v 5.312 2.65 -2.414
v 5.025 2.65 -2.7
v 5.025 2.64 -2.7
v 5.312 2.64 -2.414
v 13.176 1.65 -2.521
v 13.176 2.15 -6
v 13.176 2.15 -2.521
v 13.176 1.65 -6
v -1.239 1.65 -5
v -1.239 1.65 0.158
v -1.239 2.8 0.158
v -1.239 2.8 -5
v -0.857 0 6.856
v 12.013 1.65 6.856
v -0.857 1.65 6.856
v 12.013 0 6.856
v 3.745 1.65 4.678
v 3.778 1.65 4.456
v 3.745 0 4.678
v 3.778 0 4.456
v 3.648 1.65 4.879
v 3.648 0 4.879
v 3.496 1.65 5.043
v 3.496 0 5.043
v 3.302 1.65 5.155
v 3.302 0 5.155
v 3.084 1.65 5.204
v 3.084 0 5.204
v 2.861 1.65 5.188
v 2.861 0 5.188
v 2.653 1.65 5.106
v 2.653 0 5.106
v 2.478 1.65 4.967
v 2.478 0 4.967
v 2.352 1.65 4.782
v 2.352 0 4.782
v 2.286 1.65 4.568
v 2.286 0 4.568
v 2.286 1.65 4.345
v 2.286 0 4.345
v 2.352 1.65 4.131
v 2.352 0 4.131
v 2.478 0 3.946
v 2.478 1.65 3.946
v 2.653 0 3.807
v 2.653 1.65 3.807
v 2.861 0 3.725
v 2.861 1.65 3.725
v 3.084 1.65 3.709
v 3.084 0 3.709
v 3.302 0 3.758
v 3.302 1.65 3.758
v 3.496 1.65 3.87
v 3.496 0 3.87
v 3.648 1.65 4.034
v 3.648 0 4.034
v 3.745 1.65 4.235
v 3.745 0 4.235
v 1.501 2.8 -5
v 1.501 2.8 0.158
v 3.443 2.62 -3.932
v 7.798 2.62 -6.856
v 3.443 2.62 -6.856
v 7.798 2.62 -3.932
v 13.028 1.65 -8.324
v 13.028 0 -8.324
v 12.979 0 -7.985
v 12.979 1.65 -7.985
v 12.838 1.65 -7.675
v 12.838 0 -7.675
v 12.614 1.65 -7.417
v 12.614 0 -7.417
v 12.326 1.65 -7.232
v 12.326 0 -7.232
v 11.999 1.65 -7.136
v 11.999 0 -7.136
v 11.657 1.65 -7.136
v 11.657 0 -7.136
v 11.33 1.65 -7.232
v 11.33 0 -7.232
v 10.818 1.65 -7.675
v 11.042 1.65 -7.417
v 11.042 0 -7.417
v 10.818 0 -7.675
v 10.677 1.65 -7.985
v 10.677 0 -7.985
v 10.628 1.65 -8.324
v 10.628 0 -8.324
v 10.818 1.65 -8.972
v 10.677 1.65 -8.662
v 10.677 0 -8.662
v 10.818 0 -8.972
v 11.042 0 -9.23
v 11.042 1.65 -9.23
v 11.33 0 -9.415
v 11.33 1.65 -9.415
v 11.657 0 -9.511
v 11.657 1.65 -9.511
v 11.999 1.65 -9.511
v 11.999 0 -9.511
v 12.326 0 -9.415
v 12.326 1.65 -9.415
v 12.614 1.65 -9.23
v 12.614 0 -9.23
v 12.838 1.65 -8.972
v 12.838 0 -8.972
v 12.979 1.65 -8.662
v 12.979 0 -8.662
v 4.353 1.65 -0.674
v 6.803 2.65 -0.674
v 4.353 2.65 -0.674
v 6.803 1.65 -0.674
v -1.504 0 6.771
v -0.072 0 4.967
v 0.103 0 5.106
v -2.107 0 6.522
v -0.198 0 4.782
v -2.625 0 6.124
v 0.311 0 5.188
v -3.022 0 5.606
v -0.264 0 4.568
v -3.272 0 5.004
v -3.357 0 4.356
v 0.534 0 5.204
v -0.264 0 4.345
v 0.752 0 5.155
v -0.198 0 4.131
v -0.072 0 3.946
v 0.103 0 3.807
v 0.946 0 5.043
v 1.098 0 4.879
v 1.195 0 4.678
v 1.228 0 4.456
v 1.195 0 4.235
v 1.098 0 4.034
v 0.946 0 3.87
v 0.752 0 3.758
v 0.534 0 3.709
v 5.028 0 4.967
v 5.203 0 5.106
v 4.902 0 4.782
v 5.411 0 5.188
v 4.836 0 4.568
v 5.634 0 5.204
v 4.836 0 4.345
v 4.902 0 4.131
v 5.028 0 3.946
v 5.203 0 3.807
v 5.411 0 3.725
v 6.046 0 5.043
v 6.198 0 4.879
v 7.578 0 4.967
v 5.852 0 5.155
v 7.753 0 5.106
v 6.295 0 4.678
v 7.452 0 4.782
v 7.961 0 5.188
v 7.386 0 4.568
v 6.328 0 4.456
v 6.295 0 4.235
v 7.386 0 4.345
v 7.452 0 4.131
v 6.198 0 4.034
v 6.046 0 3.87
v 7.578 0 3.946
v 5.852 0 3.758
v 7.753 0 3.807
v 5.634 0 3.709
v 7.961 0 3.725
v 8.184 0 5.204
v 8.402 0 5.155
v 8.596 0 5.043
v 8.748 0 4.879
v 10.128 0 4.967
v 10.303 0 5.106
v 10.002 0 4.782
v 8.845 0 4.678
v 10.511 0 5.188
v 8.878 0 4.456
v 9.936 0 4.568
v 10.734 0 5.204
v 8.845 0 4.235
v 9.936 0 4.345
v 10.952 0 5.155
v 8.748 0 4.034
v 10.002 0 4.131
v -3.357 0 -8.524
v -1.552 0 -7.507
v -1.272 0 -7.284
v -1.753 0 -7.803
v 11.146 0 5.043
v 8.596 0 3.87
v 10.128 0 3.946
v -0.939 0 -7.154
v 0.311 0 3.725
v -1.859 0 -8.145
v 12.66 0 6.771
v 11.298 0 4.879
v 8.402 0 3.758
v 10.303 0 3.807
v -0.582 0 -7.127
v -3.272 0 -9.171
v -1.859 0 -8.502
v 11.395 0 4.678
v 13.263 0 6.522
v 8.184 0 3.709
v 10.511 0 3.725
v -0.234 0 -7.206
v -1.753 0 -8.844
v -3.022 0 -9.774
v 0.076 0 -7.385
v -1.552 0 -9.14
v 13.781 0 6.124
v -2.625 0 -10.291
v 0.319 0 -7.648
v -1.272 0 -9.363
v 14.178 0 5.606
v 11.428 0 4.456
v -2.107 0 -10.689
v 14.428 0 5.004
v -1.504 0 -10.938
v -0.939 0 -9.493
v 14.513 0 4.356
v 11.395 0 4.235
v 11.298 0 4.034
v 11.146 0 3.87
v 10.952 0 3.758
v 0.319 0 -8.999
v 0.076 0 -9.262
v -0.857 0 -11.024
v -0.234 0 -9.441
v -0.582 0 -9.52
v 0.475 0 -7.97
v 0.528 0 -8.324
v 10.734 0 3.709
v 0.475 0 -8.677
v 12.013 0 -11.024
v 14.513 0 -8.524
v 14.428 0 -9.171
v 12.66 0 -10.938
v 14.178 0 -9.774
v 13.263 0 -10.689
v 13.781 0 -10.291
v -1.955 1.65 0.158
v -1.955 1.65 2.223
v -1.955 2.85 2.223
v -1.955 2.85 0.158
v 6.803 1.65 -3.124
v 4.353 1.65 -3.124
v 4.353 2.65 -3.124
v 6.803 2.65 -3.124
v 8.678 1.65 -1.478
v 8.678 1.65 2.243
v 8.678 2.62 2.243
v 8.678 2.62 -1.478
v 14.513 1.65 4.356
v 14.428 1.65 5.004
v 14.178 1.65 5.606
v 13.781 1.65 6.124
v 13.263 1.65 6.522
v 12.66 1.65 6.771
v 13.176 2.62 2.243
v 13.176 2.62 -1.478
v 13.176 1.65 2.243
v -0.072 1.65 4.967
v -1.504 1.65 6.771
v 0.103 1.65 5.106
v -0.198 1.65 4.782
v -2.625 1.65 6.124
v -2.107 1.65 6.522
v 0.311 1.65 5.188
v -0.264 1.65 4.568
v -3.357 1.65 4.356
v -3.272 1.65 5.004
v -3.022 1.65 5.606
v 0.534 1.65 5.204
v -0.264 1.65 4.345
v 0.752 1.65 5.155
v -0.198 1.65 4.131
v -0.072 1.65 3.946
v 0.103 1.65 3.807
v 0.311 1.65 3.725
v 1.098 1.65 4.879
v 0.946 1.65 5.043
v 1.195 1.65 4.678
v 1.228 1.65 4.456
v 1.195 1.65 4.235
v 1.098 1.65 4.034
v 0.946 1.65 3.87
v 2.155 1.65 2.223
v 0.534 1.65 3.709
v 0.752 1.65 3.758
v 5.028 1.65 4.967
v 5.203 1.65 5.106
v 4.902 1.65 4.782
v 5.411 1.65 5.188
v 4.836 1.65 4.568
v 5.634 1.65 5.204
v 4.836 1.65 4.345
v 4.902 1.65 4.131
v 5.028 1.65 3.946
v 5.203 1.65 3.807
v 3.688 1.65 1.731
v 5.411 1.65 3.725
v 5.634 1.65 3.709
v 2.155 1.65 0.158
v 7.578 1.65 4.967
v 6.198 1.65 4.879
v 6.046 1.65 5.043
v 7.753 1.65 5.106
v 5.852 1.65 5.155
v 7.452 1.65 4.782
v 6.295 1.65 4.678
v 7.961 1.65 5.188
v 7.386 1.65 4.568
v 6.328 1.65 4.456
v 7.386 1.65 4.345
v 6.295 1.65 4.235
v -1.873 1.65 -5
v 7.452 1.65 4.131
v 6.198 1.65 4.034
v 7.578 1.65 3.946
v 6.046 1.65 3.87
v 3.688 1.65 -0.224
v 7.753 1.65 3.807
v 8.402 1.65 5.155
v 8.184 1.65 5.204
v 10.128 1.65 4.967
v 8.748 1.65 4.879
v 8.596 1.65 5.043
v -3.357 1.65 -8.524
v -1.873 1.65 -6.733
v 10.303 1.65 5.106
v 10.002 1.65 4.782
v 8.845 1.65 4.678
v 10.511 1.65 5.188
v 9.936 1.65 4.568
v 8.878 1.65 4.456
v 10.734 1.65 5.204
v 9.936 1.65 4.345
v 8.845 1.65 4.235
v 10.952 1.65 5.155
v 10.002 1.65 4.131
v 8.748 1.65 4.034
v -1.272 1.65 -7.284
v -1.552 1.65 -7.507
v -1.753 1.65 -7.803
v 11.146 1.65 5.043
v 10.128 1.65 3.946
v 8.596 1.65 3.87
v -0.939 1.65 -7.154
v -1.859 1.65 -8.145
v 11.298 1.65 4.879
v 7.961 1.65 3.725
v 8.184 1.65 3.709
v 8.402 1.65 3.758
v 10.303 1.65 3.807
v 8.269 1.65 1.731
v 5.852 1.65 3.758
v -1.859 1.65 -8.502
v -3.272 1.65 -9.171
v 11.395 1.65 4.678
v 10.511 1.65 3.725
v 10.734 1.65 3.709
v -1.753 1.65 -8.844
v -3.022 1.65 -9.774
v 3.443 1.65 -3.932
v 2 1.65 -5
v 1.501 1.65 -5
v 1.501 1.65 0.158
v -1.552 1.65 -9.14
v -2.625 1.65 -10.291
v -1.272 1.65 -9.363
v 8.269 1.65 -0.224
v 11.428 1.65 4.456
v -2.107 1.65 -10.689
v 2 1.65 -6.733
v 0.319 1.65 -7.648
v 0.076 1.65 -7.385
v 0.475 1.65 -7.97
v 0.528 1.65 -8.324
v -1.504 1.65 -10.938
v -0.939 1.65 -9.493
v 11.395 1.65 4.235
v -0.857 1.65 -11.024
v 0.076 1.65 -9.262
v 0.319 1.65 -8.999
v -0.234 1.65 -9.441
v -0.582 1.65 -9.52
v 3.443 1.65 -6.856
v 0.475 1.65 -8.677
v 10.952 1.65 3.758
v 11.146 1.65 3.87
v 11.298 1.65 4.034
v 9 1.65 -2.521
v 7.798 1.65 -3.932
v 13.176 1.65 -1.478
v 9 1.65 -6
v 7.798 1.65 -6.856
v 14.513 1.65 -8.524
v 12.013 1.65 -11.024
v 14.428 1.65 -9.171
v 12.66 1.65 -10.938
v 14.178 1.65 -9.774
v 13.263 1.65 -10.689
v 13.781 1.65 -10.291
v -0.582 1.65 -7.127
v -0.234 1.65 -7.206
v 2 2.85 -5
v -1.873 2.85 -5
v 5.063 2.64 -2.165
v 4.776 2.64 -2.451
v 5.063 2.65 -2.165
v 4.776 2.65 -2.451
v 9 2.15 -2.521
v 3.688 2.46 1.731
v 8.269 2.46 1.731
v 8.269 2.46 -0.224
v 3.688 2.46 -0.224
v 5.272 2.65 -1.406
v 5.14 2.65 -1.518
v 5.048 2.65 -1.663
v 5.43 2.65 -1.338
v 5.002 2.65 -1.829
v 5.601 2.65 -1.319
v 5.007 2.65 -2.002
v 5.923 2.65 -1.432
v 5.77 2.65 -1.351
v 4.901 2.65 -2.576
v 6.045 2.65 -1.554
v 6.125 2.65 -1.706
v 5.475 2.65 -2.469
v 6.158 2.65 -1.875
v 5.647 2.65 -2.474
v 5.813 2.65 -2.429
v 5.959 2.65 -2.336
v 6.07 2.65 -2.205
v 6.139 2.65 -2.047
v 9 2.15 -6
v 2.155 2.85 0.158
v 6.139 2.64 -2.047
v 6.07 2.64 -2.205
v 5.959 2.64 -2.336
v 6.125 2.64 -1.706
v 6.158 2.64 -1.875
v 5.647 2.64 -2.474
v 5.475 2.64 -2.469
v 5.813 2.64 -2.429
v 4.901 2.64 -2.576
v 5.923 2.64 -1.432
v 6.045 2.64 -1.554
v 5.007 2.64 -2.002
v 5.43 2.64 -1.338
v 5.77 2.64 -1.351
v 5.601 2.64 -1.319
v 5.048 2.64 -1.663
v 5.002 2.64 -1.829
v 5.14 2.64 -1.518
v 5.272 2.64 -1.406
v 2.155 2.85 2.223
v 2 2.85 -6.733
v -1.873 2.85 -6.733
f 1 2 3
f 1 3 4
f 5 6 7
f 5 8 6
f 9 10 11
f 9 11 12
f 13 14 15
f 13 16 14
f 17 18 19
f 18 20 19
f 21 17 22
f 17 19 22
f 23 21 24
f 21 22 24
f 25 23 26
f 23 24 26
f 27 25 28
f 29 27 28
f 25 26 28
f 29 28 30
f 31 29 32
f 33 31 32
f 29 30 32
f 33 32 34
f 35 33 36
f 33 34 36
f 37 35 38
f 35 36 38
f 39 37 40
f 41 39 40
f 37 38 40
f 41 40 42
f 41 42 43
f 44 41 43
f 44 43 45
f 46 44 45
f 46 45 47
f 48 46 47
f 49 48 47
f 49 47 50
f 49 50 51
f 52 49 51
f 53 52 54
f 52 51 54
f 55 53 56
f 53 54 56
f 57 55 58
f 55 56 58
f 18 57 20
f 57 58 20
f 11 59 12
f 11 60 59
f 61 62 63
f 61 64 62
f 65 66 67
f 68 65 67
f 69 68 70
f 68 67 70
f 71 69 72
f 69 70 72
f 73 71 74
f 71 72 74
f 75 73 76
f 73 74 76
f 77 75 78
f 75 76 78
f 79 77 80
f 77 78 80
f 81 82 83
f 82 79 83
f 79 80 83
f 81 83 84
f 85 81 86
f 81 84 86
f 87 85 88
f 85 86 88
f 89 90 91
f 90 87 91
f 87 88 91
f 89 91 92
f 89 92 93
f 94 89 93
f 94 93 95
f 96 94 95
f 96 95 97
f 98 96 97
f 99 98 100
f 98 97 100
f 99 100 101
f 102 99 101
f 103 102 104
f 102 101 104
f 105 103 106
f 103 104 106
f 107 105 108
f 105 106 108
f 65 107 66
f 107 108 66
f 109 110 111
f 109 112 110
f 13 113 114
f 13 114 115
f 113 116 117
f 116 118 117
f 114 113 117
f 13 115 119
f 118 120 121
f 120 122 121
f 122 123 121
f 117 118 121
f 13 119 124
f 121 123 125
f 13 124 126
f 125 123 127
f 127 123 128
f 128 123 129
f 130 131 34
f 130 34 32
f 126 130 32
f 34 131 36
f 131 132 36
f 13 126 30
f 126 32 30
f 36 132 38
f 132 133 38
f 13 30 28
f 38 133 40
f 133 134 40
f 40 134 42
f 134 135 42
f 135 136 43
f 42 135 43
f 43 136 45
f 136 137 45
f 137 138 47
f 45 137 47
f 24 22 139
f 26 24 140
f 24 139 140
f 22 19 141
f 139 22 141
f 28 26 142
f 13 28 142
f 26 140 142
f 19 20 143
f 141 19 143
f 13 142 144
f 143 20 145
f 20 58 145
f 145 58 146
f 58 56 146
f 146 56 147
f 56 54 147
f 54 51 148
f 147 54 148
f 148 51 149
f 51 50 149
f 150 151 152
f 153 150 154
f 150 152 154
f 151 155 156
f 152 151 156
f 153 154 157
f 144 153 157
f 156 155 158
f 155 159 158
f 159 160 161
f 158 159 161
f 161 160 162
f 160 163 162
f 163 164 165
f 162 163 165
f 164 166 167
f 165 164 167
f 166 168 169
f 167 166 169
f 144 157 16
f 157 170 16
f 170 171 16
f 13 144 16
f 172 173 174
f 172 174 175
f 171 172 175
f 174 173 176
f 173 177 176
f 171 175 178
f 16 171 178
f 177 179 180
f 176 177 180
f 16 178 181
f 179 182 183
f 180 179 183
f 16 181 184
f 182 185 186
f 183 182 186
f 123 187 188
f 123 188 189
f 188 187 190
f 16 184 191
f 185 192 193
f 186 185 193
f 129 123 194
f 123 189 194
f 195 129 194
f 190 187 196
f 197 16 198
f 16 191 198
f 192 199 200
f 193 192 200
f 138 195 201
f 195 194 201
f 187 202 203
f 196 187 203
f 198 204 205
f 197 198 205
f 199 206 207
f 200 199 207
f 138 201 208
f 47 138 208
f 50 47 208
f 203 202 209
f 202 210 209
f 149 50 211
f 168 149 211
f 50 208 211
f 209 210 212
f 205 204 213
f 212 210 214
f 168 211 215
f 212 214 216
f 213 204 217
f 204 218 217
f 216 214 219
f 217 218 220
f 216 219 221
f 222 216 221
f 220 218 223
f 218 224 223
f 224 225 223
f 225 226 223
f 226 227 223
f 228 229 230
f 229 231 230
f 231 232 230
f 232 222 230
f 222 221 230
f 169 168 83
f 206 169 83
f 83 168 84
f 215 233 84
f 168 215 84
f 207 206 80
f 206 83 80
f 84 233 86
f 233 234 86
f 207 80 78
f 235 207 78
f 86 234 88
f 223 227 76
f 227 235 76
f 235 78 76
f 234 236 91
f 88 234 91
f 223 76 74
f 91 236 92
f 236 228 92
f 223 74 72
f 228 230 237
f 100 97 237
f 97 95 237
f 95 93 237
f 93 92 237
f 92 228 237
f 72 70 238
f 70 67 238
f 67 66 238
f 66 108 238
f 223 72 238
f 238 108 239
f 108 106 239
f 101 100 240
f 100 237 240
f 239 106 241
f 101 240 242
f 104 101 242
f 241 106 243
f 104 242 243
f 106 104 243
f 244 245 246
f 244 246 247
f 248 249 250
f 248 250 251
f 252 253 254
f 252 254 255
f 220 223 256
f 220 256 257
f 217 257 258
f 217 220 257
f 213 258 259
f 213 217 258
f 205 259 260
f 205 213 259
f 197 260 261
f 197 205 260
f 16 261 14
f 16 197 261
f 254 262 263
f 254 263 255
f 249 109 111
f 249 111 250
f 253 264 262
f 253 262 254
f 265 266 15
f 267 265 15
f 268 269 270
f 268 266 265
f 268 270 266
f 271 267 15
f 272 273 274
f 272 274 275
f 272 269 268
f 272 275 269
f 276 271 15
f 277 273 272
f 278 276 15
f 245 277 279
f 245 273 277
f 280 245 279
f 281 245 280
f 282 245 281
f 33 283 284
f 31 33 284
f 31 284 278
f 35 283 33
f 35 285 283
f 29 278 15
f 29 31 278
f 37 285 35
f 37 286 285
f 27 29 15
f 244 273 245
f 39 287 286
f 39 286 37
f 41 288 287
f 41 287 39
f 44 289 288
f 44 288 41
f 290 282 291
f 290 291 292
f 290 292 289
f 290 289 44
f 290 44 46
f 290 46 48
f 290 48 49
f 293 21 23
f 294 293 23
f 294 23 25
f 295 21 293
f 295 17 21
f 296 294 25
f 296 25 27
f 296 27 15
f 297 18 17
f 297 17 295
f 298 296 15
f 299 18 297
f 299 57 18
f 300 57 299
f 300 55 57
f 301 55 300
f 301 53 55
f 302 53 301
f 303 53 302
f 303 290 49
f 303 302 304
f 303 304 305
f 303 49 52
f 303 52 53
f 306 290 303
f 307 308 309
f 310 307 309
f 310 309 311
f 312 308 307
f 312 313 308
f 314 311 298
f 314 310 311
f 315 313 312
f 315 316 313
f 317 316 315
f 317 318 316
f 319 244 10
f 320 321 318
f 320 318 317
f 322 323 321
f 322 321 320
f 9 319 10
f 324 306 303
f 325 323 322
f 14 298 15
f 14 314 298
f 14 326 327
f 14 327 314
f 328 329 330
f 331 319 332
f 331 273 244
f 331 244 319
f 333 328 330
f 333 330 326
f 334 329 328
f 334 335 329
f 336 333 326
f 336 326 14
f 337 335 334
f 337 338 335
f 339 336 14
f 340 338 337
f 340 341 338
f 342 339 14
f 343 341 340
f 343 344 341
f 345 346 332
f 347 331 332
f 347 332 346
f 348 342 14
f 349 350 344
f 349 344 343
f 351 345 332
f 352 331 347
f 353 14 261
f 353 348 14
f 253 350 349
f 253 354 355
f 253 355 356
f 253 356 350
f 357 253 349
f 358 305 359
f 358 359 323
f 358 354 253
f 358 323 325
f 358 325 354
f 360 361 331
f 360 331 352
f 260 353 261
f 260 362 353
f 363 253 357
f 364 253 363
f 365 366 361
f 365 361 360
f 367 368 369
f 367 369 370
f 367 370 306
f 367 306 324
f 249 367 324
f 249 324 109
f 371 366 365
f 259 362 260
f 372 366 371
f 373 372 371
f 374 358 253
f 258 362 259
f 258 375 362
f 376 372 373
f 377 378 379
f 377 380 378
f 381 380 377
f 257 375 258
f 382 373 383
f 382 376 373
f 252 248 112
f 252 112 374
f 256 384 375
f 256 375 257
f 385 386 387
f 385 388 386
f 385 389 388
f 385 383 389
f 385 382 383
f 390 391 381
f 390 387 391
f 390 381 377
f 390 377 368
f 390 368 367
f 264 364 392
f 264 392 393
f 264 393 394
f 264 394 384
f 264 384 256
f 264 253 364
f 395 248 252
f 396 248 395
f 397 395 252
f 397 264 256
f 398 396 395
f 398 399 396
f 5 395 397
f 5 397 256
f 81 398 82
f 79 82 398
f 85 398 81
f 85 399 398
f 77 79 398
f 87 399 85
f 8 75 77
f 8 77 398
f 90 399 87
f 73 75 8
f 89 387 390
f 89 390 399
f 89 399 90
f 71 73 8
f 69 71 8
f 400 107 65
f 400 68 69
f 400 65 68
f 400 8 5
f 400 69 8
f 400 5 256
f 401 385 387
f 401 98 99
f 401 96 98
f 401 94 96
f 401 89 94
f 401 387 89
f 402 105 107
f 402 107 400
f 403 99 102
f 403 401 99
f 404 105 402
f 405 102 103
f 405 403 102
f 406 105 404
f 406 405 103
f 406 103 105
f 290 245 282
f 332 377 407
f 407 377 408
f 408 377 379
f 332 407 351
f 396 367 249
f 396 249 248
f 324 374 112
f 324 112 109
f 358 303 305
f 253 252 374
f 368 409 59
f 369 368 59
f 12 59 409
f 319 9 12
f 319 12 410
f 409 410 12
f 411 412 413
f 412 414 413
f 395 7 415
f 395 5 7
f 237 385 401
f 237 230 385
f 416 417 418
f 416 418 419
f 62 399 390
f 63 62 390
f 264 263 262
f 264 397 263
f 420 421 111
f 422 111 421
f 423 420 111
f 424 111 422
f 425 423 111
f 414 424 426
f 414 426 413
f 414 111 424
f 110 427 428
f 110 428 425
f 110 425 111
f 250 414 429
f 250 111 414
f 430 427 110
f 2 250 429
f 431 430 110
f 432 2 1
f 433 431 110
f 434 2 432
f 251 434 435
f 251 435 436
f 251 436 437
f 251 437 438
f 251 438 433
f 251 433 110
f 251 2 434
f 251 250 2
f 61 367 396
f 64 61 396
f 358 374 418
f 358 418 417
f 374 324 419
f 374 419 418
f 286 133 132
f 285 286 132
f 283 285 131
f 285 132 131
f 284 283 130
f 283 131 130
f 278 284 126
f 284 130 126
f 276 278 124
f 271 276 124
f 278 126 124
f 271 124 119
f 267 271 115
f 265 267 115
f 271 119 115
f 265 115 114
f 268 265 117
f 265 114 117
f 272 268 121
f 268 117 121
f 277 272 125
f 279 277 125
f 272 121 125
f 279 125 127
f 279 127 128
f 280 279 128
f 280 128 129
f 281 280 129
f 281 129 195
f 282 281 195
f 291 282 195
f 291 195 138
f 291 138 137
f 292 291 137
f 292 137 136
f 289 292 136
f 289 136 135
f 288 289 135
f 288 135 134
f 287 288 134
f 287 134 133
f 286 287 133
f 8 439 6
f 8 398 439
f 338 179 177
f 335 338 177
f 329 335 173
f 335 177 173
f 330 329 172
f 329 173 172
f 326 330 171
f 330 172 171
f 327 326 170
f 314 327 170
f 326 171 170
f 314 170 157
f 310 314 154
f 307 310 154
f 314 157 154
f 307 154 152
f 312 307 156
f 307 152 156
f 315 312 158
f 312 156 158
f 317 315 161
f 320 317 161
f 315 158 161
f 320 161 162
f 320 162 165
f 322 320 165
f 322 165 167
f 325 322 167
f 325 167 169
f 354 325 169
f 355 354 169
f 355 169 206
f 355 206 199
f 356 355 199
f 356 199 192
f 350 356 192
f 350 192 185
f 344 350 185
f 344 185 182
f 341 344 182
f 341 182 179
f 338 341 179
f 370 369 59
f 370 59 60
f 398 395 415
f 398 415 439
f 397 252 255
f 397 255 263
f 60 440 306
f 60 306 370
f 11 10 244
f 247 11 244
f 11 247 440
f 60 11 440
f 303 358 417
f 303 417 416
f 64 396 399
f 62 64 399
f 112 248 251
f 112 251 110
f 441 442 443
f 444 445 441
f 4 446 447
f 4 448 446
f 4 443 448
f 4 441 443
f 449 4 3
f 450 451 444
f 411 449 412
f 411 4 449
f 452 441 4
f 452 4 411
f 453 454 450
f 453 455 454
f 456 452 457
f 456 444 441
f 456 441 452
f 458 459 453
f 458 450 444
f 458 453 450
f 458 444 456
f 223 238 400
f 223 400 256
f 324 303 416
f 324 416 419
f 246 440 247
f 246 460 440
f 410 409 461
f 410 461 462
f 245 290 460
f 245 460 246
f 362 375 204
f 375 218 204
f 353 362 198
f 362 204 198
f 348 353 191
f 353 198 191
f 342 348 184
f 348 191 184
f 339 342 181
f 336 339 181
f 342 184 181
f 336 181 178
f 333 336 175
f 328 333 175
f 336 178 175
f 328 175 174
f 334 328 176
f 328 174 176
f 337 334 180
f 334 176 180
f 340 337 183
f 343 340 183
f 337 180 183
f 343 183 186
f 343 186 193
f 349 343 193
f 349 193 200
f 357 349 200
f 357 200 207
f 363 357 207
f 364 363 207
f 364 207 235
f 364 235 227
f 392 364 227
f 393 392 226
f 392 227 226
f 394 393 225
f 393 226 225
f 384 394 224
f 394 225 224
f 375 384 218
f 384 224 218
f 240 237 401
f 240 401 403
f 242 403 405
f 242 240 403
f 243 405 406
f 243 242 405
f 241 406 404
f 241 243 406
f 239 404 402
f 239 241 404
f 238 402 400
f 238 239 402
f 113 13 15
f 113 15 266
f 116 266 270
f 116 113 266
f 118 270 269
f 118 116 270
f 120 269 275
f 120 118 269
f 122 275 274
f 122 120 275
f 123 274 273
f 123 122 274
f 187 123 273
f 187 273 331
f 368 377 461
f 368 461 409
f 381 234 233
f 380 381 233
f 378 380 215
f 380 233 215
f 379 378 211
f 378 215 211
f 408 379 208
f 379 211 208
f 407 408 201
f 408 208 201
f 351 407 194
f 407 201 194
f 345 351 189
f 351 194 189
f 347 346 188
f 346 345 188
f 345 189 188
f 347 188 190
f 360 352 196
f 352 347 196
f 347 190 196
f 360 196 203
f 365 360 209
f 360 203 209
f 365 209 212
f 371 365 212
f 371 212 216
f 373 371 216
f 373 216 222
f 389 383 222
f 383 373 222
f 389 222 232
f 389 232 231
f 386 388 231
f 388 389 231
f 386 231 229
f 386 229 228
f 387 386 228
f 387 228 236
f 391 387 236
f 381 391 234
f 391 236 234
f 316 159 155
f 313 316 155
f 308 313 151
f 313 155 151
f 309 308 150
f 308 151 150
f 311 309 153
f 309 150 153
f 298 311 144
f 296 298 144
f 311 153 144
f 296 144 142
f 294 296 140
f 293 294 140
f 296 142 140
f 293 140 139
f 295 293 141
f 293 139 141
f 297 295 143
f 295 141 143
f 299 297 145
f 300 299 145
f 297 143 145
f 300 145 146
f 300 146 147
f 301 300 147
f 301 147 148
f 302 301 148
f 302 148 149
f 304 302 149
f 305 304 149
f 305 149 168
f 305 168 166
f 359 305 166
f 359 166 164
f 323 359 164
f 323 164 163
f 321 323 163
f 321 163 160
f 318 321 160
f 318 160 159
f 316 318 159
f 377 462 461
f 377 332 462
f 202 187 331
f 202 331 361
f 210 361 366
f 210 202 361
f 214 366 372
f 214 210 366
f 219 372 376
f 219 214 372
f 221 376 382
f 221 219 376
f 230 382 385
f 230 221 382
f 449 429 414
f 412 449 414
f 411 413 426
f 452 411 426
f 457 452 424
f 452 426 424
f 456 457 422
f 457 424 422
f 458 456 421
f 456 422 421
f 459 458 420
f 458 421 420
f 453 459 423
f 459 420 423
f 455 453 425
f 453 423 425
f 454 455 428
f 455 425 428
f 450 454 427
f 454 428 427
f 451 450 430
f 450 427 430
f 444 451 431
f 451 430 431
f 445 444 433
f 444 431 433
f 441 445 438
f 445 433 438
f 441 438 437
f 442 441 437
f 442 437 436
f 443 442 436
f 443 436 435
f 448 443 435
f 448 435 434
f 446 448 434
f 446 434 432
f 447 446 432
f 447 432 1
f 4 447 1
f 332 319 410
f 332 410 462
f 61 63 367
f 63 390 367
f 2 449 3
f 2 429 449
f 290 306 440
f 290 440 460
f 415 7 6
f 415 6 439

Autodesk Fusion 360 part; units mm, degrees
sketch "Sketch1" plane through (0, 0, 0) normal (0, 1, 0) x (1, 0, 0)
  line L0 (-0.857, 11.0235) -> (12.013, 11.0235)
  line L1 (14.513, 8.5235) -> (14.513, -4.3565)
  line L2 (12.013, -6.8565) -> (-0.857, -6.8565)
  line L3 (-3.357, -4.3565) -> (-3.357, 8.5235)
  circle A0 centre (-0.672, 8.3235) radius 1.2
  circle A1 centre (11.828, 8.3235) radius 1.2
  line L4 (4.353, 3.1235) -> (6.803, 3.1235)
  line L5 (6.803, 3.1235) -> (6.803, 0.6735)
  line L6 (6.803, 0.6735) -> (4.353, 0.6735)
  line L7 (4.353, 0.6735) -> (4.353, 3.1235)
  circle A2 centre (5.578, -4.4565) radius 0.75
  line L8 (-3.357, -4.4565) -> (14.513, -4.4565)
  circle A3 centre (8.128, -4.4565) radius 0.75
  circle A4 centre (10.678, -4.4565) radius 0.75
  circle A5 centre (3.028, -4.4565) radius 0.75
  circle A6 centre (0.478, -4.4565) radius 0.75
  arc A7 (-0.857, 11.0235) -> (-3.357, 8.5235) centre (-0.857, 8.5235) ccw
  arc A8 (14.513, 8.5235) -> (12.013, 11.0235) centre (12.013, 8.5235) ccw
  arc A9 (12.013, -6.8565) -> (14.513, -4.3565) centre (12.013, -4.3565) ccw
  arc A10 (-3.357, -4.3565) -> (-0.857, -6.8565) centre (-0.857, -4.3565) ccw
  line L9 (5.578, 11.0235) -> (5.578, -6.8565)
  line L10 (-0.672, 8.3235) -> (11.828, 8.3235)
  dimension "d1" = 2.4
  dimension "d4" = 17.88
  dimension "d5" = 2.7
  dimension "d6" = 2.7
  dimension "d7" = 2.45
  dimension "d8" = 2.45
  dimension "d12" = 1.5
  dimension "d13" = 2.4
  dimension "d18" = 2.55
  dimension "d19" = 2.55
  dimension "d20" = 2.55
  dimension "d21" = 2.55
  dimension "d22" = 2.5
  dimension "d27" = 5.2
  dimension "d51" = 12.5
  dimension "d52" = 17.87
extrude "Extrude1" add sketch "Sketch1" along normal blind 1.65 contours L0 L3 L4 L6 L7 A2 L8 A5 A6 A7 A10 L9 | L0 L1 L4 L5 L6 A2 L8 A3 A4 A8 A9 L9 | L2 A2 L8 A5 A6 A10 L9 | L2 A2 L8 A3 A4 A9 L9
extrude "Extrude2" add sketch "Sketch1" along normal blind 2.65 contours L4 L6 L7 L9 | L4 L5 L6 L9
sketch "Sketch2" plane through (0, 1.65, 0) normal (0, 1, 0) x (-1, 0, 0)
  circle A0 centre (-5.578, 4.4565) radius 0.75
  circle A1 centre (-0.478, 4.4565) radius 0.75
  circle A2 centre (0.672, -8.3235) radius 1.2
  circle A3 centre (-10.678, 4.4565) radius 0.75
  circle A4 centre (-8.128, 4.4565) radius 0.75
  line L0 (-6.803, -0.6735) -> (-4.353, -0.6735)
  line L1 (-4.353, -0.6735) -> (-4.353, -3.1235)
  line L2 (-4.353, -3.1235) -> (-6.803, -3.1235)
  line L3 (-6.803, -3.1235) -> (-6.803, -0.6735)
  circle A5 centre (-3.028, 4.4565) radius 0.75
  circle A6 centre (-11.828, -8.3235) radius 1.2
  arc A7 (0.857, -11.0235) -> (3.357, -8.5235) centre (0.857, -8.5235) ccw
  line L4 (3.357, -8.5235) -> (3.357, 4.3565)
  arc A8 (3.357, 4.3565) -> (0.857, 6.8565) centre (0.857, 4.3565) ccw
  line L5 (0.857, 6.8565) -> (-12.013, 6.8565)
  arc A9 (-12.013, 6.8565) -> (-14.513, 4.3565) centre (-12.013, 4.3565) ccw
  line L6 (-14.513, 4.3565) -> (-14.513, -8.5235)
  arc A10 (-14.513, -8.5235) -> (-12.013, -11.0235) centre (-12.013, -8.5235) ccw
  line L7 (-12.013, -11.0235) -> (0.857, -11.0235)
  line L8 (1.8732, -6.733) -> (-2, -6.733)
  line L9 (-2, -6.733) -> (-2, -5)
  line L10 (-2, -5) -> (1.8732, -5)
  line L11 (1.8732, -5) -> (1.8732, -6.733)
  line L12 (1.2394, -5) -> (-1.5006, -5)
  line L13 (-1.5006, -5) -> (-1.5006, 0.1577)
  line L14 (-1.5006, 0.1577) -> (1.2394, 0.1577)
  line L15 (1.2394, 0.1577) -> (1.2394, -5)
  line L16 (1.955, 0.1577) -> (-2.1549, 0.1577)
  line L17 (-2.1549, 0.1577) -> (-2.1549, 2.2229)
  line L18 (-2.1549, 2.2229) -> (1.955, 2.2229)
  line L19 (1.955, 2.2229) -> (1.955, 0.1577)
  line L20 (-3.6884, -0.224) -> (-8.2686, -0.224)
  line L21 (-8.2686, -0.224) -> (-8.2686, 1.731)
  line L22 (-8.2686, 1.731) -> (-3.6884, 1.731)
  line L23 (-3.6884, 1.731) -> (-3.6884, -0.224)
  line L24 (-3.4431, -3.9317) -> (-7.7984, -3.9317)
  line L25 (-7.7984, -3.9317) -> (-7.7984, -6.8557)
  line L26 (-7.7984, -6.8557) -> (-3.4431, -6.8557)
  line L27 (-3.4431, -6.8557) -> (-3.4431, -3.9317)
  line L28 (-9, -6) -> (-13.176, -6)
  line L29 (-13.176, -6) -> (-13.176, -2.5209)
  line L30 (-13.176, -2.5209) -> (-9, -2.5209)
  line L31 (-9, -2.5209) -> (-9, -6)
  line L32 (-8.6776, -1.4781) -> (-13.176, -1.4781)
  line L33 (-13.176, -1.4781) -> (-13.176, 2.2433)
  line L34 (-13.176, 2.2433) -> (-8.6776, 2.2433)
  line L35 (-8.6776, 2.2433) -> (-8.6776, -1.4781)
extrude "Extrude3" add sketch "Sketch2" along normal blind 1.2 contours L8 L9 L10 L11 L12 | L14 L16 L17 L18 L19
extrude "Extrude4" add sketch "Sketch2" along normal blind 0.97 contours L24 L25 L26 L27 | L32 L33 L34 L35
extrude "Extrude5" add sketch "Sketch2" along normal blind 0.5 contours L28 L29 L30 L31
extrude "Extrude6" add sketch "Sketch2" along normal blind 1.15 contours L10 L12 L13 L14 L15 L16
extrude "Extrude7" add sketch "Sketch2" along normal blind 0.81 contours L20 L21 L22 L23
sketch "Sketch3" plane through (0, 2.65, 0) normal (0, 1, 0) x (-1, 0, 0)
  line L0 (-4.353, -0.6735) -> (-6.803, -0.6735)
  line L1 (-6.803, -0.6735) -> (-6.803, -3.1235)
  line L2 (-6.803, -3.1235) -> (-4.353, -3.1235)
  line L3 (-4.353, -3.1235) -> (-4.353, -0.6735)
  circle A0 centre (-5.578, -1.8985) radius 0.58
  line L4 (-5.578, -3.1235) -> (-5.578, -0.6735)
  line L5 (-5.578, -1.8985) -> (-4.9008, -2.5757)
  line L6 (-5.578, -1.8985) -> (-4.4704, -1.8985) construction
  line L7 (-4.9008, -2.5757) -> (-5.0253, -2.7001)
  line L8 (-5.0253, -2.7001) -> (-5.3117, -2.4137)
  line L9 (-4.9008, -2.5757) -> (-4.7764, -2.4512)
  line L10 (-4.7764, -2.4512) -> (-5.0628, -2.1648)
  dimension "d44" = 1.16
  dimension "d45" = 45
extrude "Extrude8" cut sketch "Sketch3" against normal blind 0.01 contours A0 L4 | A0 L4 L5 | A0 L4 L5 | A0 L5 L9 L10 | A0 L5 L7 L8
equation "d5 = 1.5 mm + ( ( 2.4 / 2 ) * 1 mm )"
equation "d27 = 4.0 mm + ( ( 2.4 / 2 ) * 1 mm )"
equation "d34 = 2.85 mm - 1.65 mm"
equation "d36 = 2.62 mm - 1.65 mm"
equation "d38 = 2.15 mm - 1.65 mm"
equation "d40 = 2.8 mm - 1.65 mm"
equation "d42 = 2.46 mm - 1.65 mm"
